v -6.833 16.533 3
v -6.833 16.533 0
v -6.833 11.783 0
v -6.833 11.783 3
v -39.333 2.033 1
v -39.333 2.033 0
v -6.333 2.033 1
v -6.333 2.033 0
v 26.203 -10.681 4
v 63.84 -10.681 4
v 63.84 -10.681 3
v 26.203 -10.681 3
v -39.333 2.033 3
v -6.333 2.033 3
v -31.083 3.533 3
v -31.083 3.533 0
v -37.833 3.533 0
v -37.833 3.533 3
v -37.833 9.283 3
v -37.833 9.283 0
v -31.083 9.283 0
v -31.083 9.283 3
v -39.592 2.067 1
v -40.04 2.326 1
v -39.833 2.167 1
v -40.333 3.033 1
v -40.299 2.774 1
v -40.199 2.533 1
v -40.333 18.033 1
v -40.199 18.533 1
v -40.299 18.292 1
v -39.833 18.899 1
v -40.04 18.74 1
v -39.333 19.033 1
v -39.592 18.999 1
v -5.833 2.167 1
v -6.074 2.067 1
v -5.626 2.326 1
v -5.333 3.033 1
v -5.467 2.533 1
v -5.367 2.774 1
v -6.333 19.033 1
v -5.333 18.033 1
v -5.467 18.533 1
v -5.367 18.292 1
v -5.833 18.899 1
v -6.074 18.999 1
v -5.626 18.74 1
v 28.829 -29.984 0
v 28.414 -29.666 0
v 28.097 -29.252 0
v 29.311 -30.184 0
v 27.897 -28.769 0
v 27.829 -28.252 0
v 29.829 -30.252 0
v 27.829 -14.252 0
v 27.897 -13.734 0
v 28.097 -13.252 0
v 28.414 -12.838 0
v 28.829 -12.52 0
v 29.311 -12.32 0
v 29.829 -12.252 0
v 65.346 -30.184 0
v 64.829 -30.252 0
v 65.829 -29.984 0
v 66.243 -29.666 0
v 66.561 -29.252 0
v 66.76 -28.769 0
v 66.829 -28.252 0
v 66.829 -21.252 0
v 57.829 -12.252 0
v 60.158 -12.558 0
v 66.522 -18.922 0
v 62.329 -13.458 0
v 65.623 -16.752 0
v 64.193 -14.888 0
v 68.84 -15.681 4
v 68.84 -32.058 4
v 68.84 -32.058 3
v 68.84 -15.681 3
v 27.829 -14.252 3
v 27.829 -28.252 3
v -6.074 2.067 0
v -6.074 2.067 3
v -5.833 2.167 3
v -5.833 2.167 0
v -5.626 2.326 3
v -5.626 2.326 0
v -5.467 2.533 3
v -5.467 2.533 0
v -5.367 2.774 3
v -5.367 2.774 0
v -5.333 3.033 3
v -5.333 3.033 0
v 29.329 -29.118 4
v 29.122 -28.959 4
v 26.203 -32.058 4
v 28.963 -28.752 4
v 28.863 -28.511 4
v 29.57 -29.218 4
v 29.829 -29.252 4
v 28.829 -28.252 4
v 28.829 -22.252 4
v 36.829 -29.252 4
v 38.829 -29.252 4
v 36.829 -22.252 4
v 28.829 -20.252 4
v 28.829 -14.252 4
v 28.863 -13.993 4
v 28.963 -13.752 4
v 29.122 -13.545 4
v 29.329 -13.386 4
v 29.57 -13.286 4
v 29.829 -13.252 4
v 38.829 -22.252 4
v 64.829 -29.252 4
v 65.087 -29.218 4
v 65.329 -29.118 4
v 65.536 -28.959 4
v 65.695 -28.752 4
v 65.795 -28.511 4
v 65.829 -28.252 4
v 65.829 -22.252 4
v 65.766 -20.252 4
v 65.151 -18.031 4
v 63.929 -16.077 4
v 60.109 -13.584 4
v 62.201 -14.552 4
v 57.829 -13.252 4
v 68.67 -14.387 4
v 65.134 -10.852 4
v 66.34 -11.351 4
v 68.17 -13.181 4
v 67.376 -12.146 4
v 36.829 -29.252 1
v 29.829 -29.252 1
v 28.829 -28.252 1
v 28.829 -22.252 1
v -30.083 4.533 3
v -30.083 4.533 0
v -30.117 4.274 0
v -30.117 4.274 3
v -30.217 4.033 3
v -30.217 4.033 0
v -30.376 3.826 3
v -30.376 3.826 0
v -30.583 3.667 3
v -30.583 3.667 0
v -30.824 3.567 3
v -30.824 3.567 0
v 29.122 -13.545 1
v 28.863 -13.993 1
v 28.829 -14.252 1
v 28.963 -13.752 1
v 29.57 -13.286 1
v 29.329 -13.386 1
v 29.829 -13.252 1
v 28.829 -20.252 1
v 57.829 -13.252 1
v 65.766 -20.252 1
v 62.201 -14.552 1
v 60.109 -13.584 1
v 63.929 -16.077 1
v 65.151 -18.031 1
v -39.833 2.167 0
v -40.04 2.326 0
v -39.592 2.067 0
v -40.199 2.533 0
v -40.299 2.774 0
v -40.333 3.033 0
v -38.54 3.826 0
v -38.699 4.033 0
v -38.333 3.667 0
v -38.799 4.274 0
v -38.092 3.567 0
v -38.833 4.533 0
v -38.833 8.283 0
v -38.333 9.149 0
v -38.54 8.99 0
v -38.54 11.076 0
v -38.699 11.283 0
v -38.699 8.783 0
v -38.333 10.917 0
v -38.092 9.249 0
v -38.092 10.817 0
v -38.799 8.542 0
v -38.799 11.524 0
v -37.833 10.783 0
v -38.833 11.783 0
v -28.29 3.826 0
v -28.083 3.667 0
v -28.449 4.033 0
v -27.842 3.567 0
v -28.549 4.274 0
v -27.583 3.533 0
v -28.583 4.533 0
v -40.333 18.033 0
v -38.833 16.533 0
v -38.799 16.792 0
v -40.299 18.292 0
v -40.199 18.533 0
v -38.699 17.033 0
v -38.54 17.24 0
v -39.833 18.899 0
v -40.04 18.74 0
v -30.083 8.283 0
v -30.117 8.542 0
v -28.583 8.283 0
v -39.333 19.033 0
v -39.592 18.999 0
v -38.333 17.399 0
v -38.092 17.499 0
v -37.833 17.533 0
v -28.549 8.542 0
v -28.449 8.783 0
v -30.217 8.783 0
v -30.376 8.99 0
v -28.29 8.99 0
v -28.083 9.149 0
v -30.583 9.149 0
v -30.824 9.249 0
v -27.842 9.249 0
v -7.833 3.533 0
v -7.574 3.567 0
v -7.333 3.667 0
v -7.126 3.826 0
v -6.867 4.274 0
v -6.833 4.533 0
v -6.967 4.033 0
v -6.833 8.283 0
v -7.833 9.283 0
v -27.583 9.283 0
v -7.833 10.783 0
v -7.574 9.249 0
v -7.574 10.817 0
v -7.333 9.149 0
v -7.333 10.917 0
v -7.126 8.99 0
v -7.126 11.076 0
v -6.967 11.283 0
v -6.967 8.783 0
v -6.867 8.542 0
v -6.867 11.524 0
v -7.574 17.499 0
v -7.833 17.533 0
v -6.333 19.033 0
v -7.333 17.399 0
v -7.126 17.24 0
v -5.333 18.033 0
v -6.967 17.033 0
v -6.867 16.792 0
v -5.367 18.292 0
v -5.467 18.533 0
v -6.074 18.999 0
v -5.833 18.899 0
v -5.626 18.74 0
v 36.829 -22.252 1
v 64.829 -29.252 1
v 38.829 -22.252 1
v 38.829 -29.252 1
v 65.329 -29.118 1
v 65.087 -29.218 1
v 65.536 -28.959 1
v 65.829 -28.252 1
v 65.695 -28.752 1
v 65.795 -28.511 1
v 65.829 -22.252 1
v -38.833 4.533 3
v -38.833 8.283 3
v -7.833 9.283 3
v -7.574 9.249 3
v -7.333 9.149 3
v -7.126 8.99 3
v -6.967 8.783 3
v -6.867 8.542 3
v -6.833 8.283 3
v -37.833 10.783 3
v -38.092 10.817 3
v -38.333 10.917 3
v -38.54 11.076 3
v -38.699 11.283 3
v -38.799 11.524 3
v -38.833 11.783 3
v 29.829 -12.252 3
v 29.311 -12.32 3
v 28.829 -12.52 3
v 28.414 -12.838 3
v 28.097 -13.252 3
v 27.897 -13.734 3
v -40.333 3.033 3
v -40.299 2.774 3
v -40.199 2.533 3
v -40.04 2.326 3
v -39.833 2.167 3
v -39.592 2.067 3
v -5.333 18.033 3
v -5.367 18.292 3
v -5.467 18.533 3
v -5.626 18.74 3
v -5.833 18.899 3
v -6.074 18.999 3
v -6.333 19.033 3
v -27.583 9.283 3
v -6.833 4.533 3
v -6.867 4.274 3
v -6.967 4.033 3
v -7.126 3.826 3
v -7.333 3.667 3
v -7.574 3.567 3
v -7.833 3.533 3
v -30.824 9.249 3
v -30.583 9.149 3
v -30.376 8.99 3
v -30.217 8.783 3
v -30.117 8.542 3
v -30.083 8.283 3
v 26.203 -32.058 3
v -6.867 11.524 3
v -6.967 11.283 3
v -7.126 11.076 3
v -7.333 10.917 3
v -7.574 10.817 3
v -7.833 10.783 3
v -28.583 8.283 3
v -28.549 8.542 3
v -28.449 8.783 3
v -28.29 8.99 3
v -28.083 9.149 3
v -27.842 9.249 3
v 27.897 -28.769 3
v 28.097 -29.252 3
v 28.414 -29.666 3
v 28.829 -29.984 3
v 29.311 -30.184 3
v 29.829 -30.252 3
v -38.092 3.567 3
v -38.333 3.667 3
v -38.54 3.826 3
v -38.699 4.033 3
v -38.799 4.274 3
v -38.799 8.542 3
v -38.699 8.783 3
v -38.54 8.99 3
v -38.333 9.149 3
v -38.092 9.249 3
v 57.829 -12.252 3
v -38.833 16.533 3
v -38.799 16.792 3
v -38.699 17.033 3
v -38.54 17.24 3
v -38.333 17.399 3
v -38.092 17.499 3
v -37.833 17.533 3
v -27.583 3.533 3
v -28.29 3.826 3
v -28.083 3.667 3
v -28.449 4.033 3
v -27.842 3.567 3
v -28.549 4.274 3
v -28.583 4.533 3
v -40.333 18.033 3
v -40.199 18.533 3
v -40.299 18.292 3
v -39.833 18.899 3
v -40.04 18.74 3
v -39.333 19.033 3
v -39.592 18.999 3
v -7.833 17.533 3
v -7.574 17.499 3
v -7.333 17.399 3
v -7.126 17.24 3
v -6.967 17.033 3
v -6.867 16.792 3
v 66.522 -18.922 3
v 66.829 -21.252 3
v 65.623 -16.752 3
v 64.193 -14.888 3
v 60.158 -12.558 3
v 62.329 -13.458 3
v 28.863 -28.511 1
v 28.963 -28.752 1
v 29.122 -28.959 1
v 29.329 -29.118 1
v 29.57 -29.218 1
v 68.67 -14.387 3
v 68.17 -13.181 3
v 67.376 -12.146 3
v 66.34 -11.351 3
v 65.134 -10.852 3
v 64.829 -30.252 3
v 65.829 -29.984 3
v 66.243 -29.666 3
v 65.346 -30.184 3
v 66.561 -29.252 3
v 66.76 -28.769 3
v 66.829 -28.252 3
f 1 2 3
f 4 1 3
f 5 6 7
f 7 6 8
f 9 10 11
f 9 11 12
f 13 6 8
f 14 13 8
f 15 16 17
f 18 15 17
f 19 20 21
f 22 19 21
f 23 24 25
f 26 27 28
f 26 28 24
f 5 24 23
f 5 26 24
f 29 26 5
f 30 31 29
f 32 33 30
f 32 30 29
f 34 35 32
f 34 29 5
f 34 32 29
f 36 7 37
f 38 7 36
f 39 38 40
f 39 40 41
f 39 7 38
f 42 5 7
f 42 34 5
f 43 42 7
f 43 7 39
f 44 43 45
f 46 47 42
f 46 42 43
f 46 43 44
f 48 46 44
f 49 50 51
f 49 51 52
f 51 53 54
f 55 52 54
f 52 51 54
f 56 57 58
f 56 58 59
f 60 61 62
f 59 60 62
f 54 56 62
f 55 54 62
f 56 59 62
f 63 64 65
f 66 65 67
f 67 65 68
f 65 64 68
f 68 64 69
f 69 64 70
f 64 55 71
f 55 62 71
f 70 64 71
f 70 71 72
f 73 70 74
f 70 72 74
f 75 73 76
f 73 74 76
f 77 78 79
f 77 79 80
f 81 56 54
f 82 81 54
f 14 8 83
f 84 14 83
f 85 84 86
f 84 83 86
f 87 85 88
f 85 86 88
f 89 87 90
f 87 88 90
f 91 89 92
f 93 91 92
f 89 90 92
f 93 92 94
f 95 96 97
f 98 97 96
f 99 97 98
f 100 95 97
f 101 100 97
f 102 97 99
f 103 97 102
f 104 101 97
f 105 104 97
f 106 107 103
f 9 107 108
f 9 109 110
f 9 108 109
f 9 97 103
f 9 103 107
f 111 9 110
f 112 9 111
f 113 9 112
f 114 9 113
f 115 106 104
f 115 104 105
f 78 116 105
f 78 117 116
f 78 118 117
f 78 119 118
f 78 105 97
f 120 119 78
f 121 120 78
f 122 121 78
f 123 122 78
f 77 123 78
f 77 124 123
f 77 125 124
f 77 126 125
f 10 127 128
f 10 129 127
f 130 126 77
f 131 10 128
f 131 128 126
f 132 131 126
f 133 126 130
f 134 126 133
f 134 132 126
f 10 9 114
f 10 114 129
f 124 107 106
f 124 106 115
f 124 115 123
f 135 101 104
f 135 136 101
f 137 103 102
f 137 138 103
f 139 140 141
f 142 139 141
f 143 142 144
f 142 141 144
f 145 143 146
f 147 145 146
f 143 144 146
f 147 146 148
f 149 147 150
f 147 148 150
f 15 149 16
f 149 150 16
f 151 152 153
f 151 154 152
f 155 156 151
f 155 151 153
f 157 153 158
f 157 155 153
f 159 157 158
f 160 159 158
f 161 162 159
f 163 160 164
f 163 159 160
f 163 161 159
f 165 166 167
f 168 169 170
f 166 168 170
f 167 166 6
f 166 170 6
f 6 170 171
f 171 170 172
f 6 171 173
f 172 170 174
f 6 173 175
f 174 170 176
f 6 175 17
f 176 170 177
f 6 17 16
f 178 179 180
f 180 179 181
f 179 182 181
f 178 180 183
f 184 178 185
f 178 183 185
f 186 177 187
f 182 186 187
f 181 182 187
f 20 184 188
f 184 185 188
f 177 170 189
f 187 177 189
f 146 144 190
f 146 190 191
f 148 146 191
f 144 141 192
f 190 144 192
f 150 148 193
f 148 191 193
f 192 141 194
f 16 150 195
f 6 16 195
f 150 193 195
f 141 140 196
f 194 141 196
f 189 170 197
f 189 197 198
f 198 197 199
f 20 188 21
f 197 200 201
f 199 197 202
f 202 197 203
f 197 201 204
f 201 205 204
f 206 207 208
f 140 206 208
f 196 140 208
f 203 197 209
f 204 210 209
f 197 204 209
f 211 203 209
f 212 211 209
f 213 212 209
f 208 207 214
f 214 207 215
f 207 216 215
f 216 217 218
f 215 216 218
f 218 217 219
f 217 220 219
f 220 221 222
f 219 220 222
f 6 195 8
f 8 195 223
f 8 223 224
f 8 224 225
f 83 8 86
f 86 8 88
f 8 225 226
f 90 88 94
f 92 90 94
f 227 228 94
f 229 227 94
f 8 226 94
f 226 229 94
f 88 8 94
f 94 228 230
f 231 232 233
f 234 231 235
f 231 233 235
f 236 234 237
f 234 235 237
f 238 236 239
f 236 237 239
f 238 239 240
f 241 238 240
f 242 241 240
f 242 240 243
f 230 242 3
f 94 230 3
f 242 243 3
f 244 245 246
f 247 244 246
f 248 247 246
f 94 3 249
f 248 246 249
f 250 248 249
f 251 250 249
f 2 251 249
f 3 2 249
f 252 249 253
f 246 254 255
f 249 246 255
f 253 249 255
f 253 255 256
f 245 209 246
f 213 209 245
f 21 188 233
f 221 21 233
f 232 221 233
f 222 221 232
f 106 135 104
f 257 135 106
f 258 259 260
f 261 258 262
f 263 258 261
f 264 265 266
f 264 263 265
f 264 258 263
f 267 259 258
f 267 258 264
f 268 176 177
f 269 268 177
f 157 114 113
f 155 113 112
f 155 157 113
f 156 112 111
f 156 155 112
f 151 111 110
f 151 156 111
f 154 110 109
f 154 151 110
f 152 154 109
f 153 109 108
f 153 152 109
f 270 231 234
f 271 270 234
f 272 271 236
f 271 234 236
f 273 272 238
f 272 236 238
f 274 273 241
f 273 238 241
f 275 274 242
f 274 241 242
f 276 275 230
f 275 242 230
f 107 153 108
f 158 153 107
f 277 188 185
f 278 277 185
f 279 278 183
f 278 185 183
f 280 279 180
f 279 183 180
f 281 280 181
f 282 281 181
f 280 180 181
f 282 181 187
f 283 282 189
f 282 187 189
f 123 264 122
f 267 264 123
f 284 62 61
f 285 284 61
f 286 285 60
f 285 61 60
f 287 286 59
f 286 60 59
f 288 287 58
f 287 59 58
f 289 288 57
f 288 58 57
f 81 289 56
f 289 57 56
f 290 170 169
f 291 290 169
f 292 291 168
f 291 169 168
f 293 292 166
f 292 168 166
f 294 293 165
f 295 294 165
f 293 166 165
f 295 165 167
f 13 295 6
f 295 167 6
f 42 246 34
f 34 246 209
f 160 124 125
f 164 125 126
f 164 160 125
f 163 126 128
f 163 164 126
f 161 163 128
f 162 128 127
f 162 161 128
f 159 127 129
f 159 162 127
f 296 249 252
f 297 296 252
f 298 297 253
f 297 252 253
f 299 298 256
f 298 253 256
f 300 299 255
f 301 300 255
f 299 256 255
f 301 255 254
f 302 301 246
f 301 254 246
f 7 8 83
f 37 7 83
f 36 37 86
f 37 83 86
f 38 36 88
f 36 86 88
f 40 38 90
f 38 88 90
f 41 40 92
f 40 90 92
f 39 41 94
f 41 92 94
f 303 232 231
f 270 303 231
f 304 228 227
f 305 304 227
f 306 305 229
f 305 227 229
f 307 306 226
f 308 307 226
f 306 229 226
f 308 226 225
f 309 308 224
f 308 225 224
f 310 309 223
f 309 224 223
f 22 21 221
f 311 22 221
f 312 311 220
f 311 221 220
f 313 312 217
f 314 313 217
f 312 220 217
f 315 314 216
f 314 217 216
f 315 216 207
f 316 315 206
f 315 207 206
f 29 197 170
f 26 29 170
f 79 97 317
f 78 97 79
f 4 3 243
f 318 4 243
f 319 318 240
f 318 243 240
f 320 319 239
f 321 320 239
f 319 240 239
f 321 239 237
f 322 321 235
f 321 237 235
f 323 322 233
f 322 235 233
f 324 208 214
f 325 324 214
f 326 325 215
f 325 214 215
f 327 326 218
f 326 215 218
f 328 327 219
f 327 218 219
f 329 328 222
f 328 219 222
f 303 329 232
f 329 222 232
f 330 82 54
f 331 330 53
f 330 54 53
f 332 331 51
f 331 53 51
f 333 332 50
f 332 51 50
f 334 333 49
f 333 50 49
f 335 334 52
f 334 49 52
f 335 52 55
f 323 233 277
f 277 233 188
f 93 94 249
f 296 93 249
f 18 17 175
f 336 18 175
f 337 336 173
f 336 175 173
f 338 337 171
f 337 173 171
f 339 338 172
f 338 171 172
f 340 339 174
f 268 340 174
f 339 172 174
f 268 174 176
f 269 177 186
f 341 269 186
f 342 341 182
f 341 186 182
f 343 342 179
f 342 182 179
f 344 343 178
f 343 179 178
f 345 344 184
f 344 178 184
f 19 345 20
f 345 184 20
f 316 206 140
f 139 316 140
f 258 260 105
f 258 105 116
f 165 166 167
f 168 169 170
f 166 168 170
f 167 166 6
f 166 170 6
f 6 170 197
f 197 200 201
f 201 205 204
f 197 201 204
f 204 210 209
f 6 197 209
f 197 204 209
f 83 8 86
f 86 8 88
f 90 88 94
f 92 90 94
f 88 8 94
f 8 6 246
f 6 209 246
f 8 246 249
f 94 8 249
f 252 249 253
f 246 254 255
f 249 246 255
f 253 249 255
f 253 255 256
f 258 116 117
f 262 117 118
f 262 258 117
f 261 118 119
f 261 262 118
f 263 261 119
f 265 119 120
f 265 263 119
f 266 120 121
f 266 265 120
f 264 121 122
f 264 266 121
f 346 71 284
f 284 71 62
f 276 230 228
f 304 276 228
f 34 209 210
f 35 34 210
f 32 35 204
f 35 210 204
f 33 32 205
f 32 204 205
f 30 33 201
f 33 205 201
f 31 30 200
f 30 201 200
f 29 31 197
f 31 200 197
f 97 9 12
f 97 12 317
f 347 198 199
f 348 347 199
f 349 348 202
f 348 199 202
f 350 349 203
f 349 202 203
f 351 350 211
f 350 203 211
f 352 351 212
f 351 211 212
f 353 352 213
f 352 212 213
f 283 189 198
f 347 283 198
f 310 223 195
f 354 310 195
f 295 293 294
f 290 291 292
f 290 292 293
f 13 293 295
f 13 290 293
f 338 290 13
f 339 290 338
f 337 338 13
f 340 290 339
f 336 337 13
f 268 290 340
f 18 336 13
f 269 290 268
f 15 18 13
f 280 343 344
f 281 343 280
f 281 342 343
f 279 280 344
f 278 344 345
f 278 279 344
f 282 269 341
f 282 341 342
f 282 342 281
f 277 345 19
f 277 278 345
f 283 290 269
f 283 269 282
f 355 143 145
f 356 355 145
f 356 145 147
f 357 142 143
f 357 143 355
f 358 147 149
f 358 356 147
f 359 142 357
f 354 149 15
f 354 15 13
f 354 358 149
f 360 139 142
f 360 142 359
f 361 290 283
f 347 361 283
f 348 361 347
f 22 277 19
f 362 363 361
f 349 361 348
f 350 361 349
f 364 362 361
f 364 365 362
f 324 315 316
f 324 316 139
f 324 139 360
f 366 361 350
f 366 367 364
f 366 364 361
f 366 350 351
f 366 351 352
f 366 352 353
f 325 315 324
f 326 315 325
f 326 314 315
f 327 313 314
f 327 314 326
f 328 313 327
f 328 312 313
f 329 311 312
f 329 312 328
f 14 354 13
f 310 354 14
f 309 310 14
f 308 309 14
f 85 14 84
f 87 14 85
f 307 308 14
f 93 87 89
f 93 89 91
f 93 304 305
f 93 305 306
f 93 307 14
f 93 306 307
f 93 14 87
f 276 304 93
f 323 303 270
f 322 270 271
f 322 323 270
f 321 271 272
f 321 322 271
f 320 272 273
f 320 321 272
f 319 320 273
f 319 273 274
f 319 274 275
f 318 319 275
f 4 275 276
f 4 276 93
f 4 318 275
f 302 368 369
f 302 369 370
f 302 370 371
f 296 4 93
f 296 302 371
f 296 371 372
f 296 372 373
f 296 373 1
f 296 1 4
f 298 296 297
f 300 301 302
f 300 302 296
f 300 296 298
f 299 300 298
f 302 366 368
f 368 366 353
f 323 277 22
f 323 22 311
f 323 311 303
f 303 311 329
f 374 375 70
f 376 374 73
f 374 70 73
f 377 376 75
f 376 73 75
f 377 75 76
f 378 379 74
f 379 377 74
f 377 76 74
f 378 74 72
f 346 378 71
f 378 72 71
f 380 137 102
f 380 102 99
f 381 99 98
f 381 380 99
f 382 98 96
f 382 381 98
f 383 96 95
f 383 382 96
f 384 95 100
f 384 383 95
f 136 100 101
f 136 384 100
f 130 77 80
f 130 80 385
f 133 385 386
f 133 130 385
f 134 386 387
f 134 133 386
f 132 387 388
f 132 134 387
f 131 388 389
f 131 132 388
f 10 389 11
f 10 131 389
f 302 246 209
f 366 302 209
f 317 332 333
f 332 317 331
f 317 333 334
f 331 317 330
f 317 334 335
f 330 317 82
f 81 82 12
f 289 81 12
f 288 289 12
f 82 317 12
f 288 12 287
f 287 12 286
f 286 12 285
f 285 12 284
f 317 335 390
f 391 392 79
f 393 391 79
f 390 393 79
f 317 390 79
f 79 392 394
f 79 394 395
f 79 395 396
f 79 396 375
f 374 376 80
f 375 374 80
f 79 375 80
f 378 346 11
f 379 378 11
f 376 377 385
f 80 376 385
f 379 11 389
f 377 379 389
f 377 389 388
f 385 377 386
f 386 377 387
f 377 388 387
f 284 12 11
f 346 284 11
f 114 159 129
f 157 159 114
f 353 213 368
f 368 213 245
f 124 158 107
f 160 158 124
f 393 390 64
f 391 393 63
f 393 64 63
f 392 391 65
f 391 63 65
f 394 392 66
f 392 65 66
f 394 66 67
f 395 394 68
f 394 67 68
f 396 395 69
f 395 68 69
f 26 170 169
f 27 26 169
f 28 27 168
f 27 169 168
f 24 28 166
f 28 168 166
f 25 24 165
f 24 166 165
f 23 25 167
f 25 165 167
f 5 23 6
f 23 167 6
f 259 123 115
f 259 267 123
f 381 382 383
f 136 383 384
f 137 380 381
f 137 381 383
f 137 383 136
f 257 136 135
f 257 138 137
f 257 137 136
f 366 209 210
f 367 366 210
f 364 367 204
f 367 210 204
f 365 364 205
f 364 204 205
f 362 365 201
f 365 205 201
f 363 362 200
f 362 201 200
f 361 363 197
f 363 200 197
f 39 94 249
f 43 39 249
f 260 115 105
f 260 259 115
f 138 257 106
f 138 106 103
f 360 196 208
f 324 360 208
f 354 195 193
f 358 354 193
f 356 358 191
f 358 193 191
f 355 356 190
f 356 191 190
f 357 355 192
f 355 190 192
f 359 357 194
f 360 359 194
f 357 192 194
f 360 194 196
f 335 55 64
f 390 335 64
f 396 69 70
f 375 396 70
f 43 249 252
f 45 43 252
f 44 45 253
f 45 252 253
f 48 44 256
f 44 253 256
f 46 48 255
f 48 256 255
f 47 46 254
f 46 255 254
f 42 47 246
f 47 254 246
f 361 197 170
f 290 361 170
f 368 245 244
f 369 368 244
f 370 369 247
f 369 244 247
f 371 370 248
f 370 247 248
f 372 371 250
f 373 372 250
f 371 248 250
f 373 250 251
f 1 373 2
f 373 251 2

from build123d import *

# Parameters (mm, degrees)
F1_DEPTH  = 3
F2_DEPTH  = 1
F4_DEPTH  = 4
F5_T      = -1
F6_DEPTH  = 4
F7_T      = -1
F8_DEPTH  = 4
F9_T      = -1
F12_DEPTH = 1


with BuildPart() as f1:
    # F0 (on Top) → F1 (new body)
    with BuildSketch(Plane.XY):
        with BuildLine():
            ThreePointArc((-40.3332337737, 3.0328043029), (-40.0403405549, 2.3256975217), (-39.3332337737, 2.0328043029))
            Line((-39.3332337737, 2.0328043029), (-6.3332337737, 2.0328043029))
            ThreePointArc((-6.3332337737, 2.0328043029), (-5.6261269925, 2.3256975217), (-5.3332337737, 3.0328043029))
            Line((-5.3332337737, 3.0328043029), (-5.3332337737, 18.0328043029))
            ThreePointArc((-5.3332337737, 18.0328043029), (-5.6261269925, 18.7399110841), (-6.3332337737, 19.0328043029))
            Line((-6.3332337737, 19.0328043029), (-39.3332337737, 19.0328043029))
            ThreePointArc((-39.3332337737, 19.0328043029), (-40.0403405549, 18.7399110841), (-40.3332337737, 18.0328043029))
            Line((-40.3332337737, 18.0328043029), (-40.3332337737, 3.0328043029))
        make_face()
        with BuildLine():
            ThreePointArc((-37.8332337737, 3.5328043029), (-38.5403405549, 3.8256975217), (-38.8332337737, 4.5328043029))
            Line((-38.8332337737, 4.5328043029), (-38.8332337737, 8.2828043029))
            ThreePointArc((-38.8332337737, 8.2828043029), (-38.5403405549, 8.9899110841), (-37.8332337737, 9.2828043029))
            Line((-37.8332337737, 9.2828043029), (-31.0832337737, 9.2828043029))
            ThreePointArc((-31.0832337737, 9.2828043029), (-30.3761269925, 8.9899110841), (-30.0832337737, 8.2828043029))
            Line((-30.0832337737, 8.2828043029), (-30.0832337737, 4.5328043029))
            ThreePointArc((-30.0832337737, 4.5328043029), (-30.3761269925, 3.8256975217), (-31.0832337737, 3.5328043029))
            Line((-31.0832337737, 3.5328043029), (-37.8332337737, 3.5328043029))
        make_face(mode=Mode.SUBTRACT)
        with BuildLine():
            Line((-6.8332337737, 8.2828043029), (-6.8332337737, 4.5328043029))
            ThreePointArc((-6.8332337737, 4.5328043029), (-7.1261269925, 3.8256975217), (-7.8332337737, 3.5328043029))
            Line((-7.8332337737, 3.5328043029), (-27.5832337737, 3.5328043029))
            ThreePointArc((-27.5832337737, 3.5328043029), (-28.2903405549, 3.8256975217), (-28.5832337737, 4.5328043029))
            Line((-28.5832337737, 4.5328043029), (-28.5832337737, 8.2828043029))
            ThreePointArc((-28.5832337737, 8.2828043029), (-28.2903405549, 8.9899110841), (-27.5832337737, 9.2828043029))
            Line((-27.5832337737, 9.2828043029), (-7.8332337737, 9.2828043029))
            ThreePointArc((-7.8332337737, 9.2828043029), (-7.1261269925, 8.9899110841), (-6.8332337737, 8.2828043029))
        make_face(mode=Mode.SUBTRACT)
        with BuildLine():
            ThreePointArc((-38.8332337737, 16.5328043029), (-38.5403405549, 17.2399110841), (-37.8332337737, 17.5328043029))
            Line((-37.8332337737, 17.5328043029), (-7.8332337737, 17.5328043029))
            ThreePointArc((-7.8332337737, 17.5328043029), (-7.1261269925, 17.2399110841), (-6.8332337737, 16.5328043029))
            Line((-6.8332337737, 16.5328043029), (-6.8332337737, 11.7828043029))
            ThreePointArc((-6.8332337737, 11.7828043029), (-7.1261269925, 11.0756975217), (-7.8332337737, 10.7828043029))
            Line((-7.8332337737, 10.7828043029), (-37.8332337737, 10.7828043029))
            ThreePointArc((-37.8332337737, 10.7828043029), (-38.5403405549, 11.0756975217), (-38.8332337737, 11.7828043029))
            Line((-38.8332337737, 11.7828043029), (-38.8332337737, 16.5328043029))
        make_face(mode=Mode.SUBTRACT)
    extrude(amount=F1_DEPTH)


with BuildPart() as f2:
    # F0 (on Top) → F2 (new body)
    with BuildSketch(Plane.XY):
        with BuildLine():
            ThreePointArc((-40.3332337737, 3.0328043029), (-40.0403405549, 2.3256975217), (-39.3332337737, 2.0328043029))
            Line((-39.3332337737, 2.0328043029), (-6.3332337737, 2.0328043029))
            ThreePointArc((-6.3332337737, 2.0328043029), (-5.6261269925, 2.3256975217), (-5.3332337737, 3.0328043029))
            Line((-5.3332337737, 3.0328043029), (-5.3332337737, 18.0328043029))
            ThreePointArc((-5.3332337737, 18.0328043029), (-5.6261269925, 18.7399110841), (-6.3332337737, 19.0328043029))
            Line((-6.3332337737, 19.0328043029), (-39.3332337737, 19.0328043029))
            ThreePointArc((-39.3332337737, 19.0328043029), (-40.0403405549, 18.7399110841), (-40.3332337737, 18.0328043029))
            Line((-40.3332337737, 18.0328043029), (-40.3332337737, 3.0328043029))
        make_face()
        with BuildLine():
            ThreePointArc((-37.8332337737, 3.5328043029), (-38.5403405549, 3.8256975217), (-38.8332337737, 4.5328043029))
            Line((-38.8332337737, 4.5328043029), (-38.8332337737, 8.2828043029))
            ThreePointArc((-38.8332337737, 8.2828043029), (-38.5403405549, 8.9899110841), (-37.8332337737, 9.2828043029))
            Line((-37.8332337737, 9.2828043029), (-31.0832337737, 9.2828043029))
            ThreePointArc((-31.0832337737, 9.2828043029), (-30.3761269925, 8.9899110841), (-30.0832337737, 8.2828043029))
            Line((-30.0832337737, 8.2828043029), (-30.0832337737, 4.5328043029))
            ThreePointArc((-30.0832337737, 4.5328043029), (-30.3761269925, 3.8256975217), (-31.0832337737, 3.5328043029))
            Line((-31.0832337737, 3.5328043029), (-37.8332337737, 3.5328043029))
        make_face(mode=Mode.SUBTRACT)
        with BuildLine():
            Line((-6.8332337737, 8.2828043029), (-6.8332337737, 4.5328043029))
            ThreePointArc((-6.8332337737, 4.5328043029), (-7.1261269925, 3.8256975217), (-7.8332337737, 3.5328043029))
            Line((-7.8332337737, 3.5328043029), (-27.5832337737, 3.5328043029))
            ThreePointArc((-27.5832337737, 3.5328043029), (-28.2903405549, 3.8256975217), (-28.5832337737, 4.5328043029))
            Line((-28.5832337737, 4.5328043029), (-28.5832337737, 8.2828043029))
            ThreePointArc((-28.5832337737, 8.2828043029), (-28.2903405549, 8.9899110841), (-27.5832337737, 9.2828043029))
            Line((-27.5832337737, 9.2828043029), (-7.8332337737, 9.2828043029))
            ThreePointArc((-7.8332337737, 9.2828043029), (-7.1261269925, 8.9899110841), (-6.8332337737, 8.2828043029))
        make_face(mode=Mode.SUBTRACT)
        with BuildLine():
            ThreePointArc((-38.8332337737, 16.5328043029), (-38.5403405549, 17.2399110841), (-37.8332337737, 17.5328043029))
            Line((-37.8332337737, 17.5328043029), (-7.8332337737, 17.5328043029))
            ThreePointArc((-7.8332337737, 17.5328043029), (-7.1261269925, 17.2399110841), (-6.8332337737, 16.5328043029))
            Line((-6.8332337737, 16.5328043029), (-6.8332337737, 11.7828043029))
            ThreePointArc((-6.8332337737, 11.7828043029), (-7.1261269925, 11.0756975217), (-7.8332337737, 10.7828043029))
            Line((-7.8332337737, 10.7828043029), (-37.8332337737, 10.7828043029))
            ThreePointArc((-37.8332337737, 10.7828043029), (-38.5403405549, 11.0756975217), (-38.8332337737, 11.7828043029))
            Line((-38.8332337737, 11.7828043029), (-38.8332337737, 16.5328043029))
        make_face(mode=Mode.SUBTRACT)
        with BuildLine():
            Line((-7.8332337737, 17.5328043029), (-37.8332337737, 17.5328043029))
            ThreePointArc((-37.8332337737, 17.5328043029), (-38.5403405549, 17.2399110841), (-38.8332337737, 16.5328043029))
            Line((-38.8332337737, 16.5328043029), (-38.8332337737, 11.7828043029))
            ThreePointArc((-38.8332337737, 11.7828043029), (-38.5403405549, 11.0756975217), (-37.8332337737, 10.7828043029))
            Line((-37.8332337737, 10.7828043029), (-7.8332337737, 10.7828043029))
            ThreePointArc((-7.8332337737, 10.7828043029), (-7.1261269925, 11.0756975217), (-6.8332337737, 11.7828043029))
            Line((-6.8332337737, 11.7828043029), (-6.8332337737, 16.5328043029))
            ThreePointArc((-6.8332337737, 16.5328043029), (-7.1261269925, 17.2399110841), (-7.8332337737, 17.5328043029))
        make_face()
        with BuildLine():
            ThreePointArc((-7.8332337737, 3.5328043029), (-7.1261269925, 3.8256975217), (-6.8332337737, 4.5328043029))
            Line((-6.8332337737, 4.5328043029), (-6.8332337737, 8.2828043029))
            ThreePointArc((-6.8332337737, 8.2828043029), (-7.1261269925, 8.9899110841), (-7.8332337737, 9.2828043029))
            Line((-7.8332337737, 9.2828043029), (-27.5832337737, 9.2828043029))
            ThreePointArc((-27.5832337737, 9.2828043029), (-28.2903405549, 8.9899110841), (-28.5832337737, 8.2828043029))
            Line((-28.5832337737, 8.2828043029), (-28.5832337737, 4.5328043029))
            ThreePointArc((-28.5832337737, 4.5328043029), (-28.2903405549, 3.8256975217), (-27.5832337737, 3.5328043029))
            Line((-27.5832337737, 3.5328043029), (-7.8332337737, 3.5328043029))
        make_face()
        with BuildLine():
            Line((-38.8332337737, 8.2828043029), (-38.8332337737, 4.5328043029))
            ThreePointArc((-38.8332337737, 4.5328043029), (-38.5403405549, 3.8256975217), (-37.8332337737, 3.5328043029))
            Line((-37.8332337737, 3.5328043029), (-31.0832337737, 3.5328043029))
            ThreePointArc((-31.0832337737, 3.5328043029), (-30.3761269925, 3.8256975217), (-30.0832337737, 4.5328043029))
            Line((-30.0832337737, 4.5328043029), (-30.0832337737, 8.2828043029))
            ThreePointArc((-30.0832337737, 8.2828043029), (-30.3761269925, 8.9899110841), (-31.0832337737, 9.2828043029))
            Line((-31.0832337737, 9.2828043029), (-37.8332337737, 9.2828043029))
            ThreePointArc((-37.8332337737, 9.2828043029), (-38.5403405549, 8.9899110841), (-38.8332337737, 8.2828043029))
        make_face()
    extrude(amount=F2_DEPTH)


with BuildPart() as f4:
    # F3 (on Top) → F4 (new body)
    with BuildSketch(Plane.XY):
        with BuildLine():
            ThreePointArc((27.8286407689, -28.2518212428), (28.4144272065, -29.6660348052), (29.8286407689, -30.2518212428))
            Line((29.8286407689, -30.2518212428), (37.8286407689, -30.2518212428))
            Line((37.8286407689, -30.2518212428), (37.8286407689, -21.2518212428))
            Line((37.8286407689, -21.2518212428), (27.8286407689, -21.2518212428))
            Line((27.8286407689, -21.2518212428), (27.8286407689, -28.2518212428))
        make_face()
    extrude(amount=F4_DEPTH)

    # F5
    f5_openings = [f4.faces().sort_by_distance(p)[0] for p in [
        (32.872487, -25.71279, 4),
    ]]
    offset(amount=F5_T, openings=f5_openings)


with BuildPart() as f6:
    # F3 (on Top) → F6 (new body)
    with BuildSketch(Plane.XY):
        with BuildLine():
            Line((37.8286407689, -21.2518212428), (37.8286407689, -30.2518212428))
            Line((37.8286407689, -30.2518212428), (64.8286407689, -30.2518212428))
            ThreePointArc((64.8286407689, -30.2518212428), (66.2428543312, -29.6660348052), (66.8286407689, -28.2518212428))
            Line((66.8286407689, -28.2518212428), (66.8286407689, -21.2518212428))
            Line((66.8286407689, -21.2518212428), (37.8286407689, -21.2518212428))
        make_face()
    extrude(amount=F6_DEPTH)

    # F7
    f7_openings = [f6.faces().sort_by_distance(p)[0] for p in [
        (52.282268, -25.738446, 4),
    ]]
    offset(amount=F7_T, openings=f7_openings)


with BuildPart() as f8:
    # F3 (on Top) → F8 (new body)
    with BuildSketch(Plane.XY):
        with BuildLine():
            Line((27.8286407689, -21.2518212428), (37.8286407689, -21.2518212428))
            Line((37.8286407689, -21.2518212428), (66.8286407689, -21.2518212428))
            ThreePointArc((66.8286407689, -21.2518212428), (64.1926017995, -14.8878602122), (57.8286407689, -12.2518212428))
            Line((57.8286407689, -12.2518212428), (29.8286407689, -12.2518212428))
            ThreePointArc((29.8286407689, -12.2518212428), (28.4144272065, -12.8376076805), (27.8286407689, -14.2518212428))
            Line((27.8286407689, -14.2518212428), (27.8286407689, -21.2518212428))
        make_face()
    extrude(amount=F8_DEPTH)

    # F9
    f9_openings = [f8.faces().sort_by_distance(p)[0] for p in [
        (46.464161, -16.892334, 4),
    ]]
    offset(amount=F9_T, openings=f9_openings)


with BuildPart() as f4_1:
    add(f4.part)

    # F10: union F6, F8
    add(f6.part)
    add(f8.part)

    # F11 (on face) → F12 (join)
    with BuildSketch(Plane.XY.offset(4)):
        with BuildLine():
            Line((26.2033231556, -10.6814363971), (26.2033231556, -32.0575349033))
            Line((26.2033231556, -32.0575349033), (68.8400119543, -32.0575349033))
            Line((68.8400119543, -32.0575349033), (68.8400119543, -15.6814363971))
            ThreePointArc((68.8400119543, -15.6814363971), (67.3755458602, -12.1459024912), (63.8400119543, -10.6814363971))
            Line((63.8400119543, -10.6814363971), (26.2033231556, -10.6814363971))
        make_face()
        with BuildLine():
            Line((27.8286407689, -28.2518212428), (27.8286407689, -14.2518212428))
            ThreePointArc((27.8286407689, -14.2518212428), (28.4144272065, -12.8376076805), (29.8286407689, -12.2518212428))
            Line((29.8286407689, -12.2518212428), (57.8286407689, -12.2518212428))
            ThreePointArc((57.8286407689, -12.2518212428), (64.1926017995, -14.8878602122), (66.8286407689, -21.2518212428))
            Line((66.8286407689, -21.2518212428), (66.8286407689, -28.2518212428))
            ThreePointArc((66.8286407689, -28.2518212428), (66.2428543312, -29.6660348052), (64.8286407689, -30.2518212428))
            Line((64.8286407689, -30.2518212428), (29.8286407689, -30.2518212428))
            ThreePointArc((29.8286407689, -30.2518212428), (28.4144272065, -29.6660348052), (27.8286407689, -28.2518212428))
        make_face(mode=Mode.SUBTRACT)
        with BuildLine():
            ThreePointArc((29.8286407689, -12.2518212428), (28.4144272065, -12.8376076805), (27.8286407689, -14.2518212428))
            Line((27.8286407689, -14.2518212428), (27.8286407689, -28.2518212428))
            ThreePointArc((27.8286407689, -28.2518212428), (28.4144272065, -29.6660348052), (29.8286407689, -30.2518212428))
            Line((29.8286407689, -30.2518212428), (64.8286407689, -30.2518212428))
            ThreePointArc((64.8286407689, -30.2518212428), (66.2428543312, -29.6660348052), (66.8286407689, -28.2518212428))
            Line((66.8286407689, -28.2518212428), (66.8286407689, -21.2518212428))
            ThreePointArc((66.8286407689, -21.2518212428), (64.1926017995, -14.8878602122), (57.8286407689, -12.2518212428))
            Line((57.8286407689, -12.2518212428), (29.8286407689, -12.2518212428))
        make_face()
        with BuildLine():
            Line((28.8286407689, -28.2518212428), (28.8286407689, -22.2518212428))
            Line((28.8286407689, -22.2518212428), (36.8286407689, -22.2518212428))
            Line((36.8286407689, -22.2518212428), (36.8286407689, -29.2518212428))
            Line((36.8286407689, -29.2518212428), (29.8286407689, -29.2518212428))
            ThreePointArc((29.8286407689, -29.2518212428), (29.1215339877, -28.958928024), (28.8286407689, -28.2518212428))
        make_face(mode=Mode.SUBTRACT)
        with BuildLine():
            Line((38.8286407689, -22.2518212428), (65.8286407689, -22.2518212428))
            Line((65.8286407689, -22.2518212428), (65.8286407689, -28.2518212428))
            ThreePointArc((65.8286407689, -28.2518212428), (65.53574755, -28.958928024), (64.8286407689, -29.2518212428))
            Line((64.8286407689, -29.2518212428), (38.8286407689, -29.2518212428))
            Line((38.8286407689, -29.2518212428), (38.8286407689, -22.2518212428))
        make_face(mode=Mode.SUBTRACT)
        with BuildLine():
            ThreePointArc((57.8286407689, -13.2518212428), (63.120143391, -15.2518212428), (65.7658947021, -20.2518212428))
            Line((65.7658947021, -20.2518212428), (28.8286407689, -20.2518212428))
            Line((28.8286407689, -20.2518212428), (28.8286407689, -14.2518212428))
            ThreePointArc((28.8286407689, -14.2518212428), (29.1215339877, -13.5447144616), (29.8286407689, -13.2518212428))
            Line((29.8286407689, -13.2518212428), (57.8286407689, -13.2518212428))
        make_face(mode=Mode.SUBTRACT)
    extrude(amount=-F12_DEPTH)


solid = Compound([f1.part, f2.part, f4_1.part])
